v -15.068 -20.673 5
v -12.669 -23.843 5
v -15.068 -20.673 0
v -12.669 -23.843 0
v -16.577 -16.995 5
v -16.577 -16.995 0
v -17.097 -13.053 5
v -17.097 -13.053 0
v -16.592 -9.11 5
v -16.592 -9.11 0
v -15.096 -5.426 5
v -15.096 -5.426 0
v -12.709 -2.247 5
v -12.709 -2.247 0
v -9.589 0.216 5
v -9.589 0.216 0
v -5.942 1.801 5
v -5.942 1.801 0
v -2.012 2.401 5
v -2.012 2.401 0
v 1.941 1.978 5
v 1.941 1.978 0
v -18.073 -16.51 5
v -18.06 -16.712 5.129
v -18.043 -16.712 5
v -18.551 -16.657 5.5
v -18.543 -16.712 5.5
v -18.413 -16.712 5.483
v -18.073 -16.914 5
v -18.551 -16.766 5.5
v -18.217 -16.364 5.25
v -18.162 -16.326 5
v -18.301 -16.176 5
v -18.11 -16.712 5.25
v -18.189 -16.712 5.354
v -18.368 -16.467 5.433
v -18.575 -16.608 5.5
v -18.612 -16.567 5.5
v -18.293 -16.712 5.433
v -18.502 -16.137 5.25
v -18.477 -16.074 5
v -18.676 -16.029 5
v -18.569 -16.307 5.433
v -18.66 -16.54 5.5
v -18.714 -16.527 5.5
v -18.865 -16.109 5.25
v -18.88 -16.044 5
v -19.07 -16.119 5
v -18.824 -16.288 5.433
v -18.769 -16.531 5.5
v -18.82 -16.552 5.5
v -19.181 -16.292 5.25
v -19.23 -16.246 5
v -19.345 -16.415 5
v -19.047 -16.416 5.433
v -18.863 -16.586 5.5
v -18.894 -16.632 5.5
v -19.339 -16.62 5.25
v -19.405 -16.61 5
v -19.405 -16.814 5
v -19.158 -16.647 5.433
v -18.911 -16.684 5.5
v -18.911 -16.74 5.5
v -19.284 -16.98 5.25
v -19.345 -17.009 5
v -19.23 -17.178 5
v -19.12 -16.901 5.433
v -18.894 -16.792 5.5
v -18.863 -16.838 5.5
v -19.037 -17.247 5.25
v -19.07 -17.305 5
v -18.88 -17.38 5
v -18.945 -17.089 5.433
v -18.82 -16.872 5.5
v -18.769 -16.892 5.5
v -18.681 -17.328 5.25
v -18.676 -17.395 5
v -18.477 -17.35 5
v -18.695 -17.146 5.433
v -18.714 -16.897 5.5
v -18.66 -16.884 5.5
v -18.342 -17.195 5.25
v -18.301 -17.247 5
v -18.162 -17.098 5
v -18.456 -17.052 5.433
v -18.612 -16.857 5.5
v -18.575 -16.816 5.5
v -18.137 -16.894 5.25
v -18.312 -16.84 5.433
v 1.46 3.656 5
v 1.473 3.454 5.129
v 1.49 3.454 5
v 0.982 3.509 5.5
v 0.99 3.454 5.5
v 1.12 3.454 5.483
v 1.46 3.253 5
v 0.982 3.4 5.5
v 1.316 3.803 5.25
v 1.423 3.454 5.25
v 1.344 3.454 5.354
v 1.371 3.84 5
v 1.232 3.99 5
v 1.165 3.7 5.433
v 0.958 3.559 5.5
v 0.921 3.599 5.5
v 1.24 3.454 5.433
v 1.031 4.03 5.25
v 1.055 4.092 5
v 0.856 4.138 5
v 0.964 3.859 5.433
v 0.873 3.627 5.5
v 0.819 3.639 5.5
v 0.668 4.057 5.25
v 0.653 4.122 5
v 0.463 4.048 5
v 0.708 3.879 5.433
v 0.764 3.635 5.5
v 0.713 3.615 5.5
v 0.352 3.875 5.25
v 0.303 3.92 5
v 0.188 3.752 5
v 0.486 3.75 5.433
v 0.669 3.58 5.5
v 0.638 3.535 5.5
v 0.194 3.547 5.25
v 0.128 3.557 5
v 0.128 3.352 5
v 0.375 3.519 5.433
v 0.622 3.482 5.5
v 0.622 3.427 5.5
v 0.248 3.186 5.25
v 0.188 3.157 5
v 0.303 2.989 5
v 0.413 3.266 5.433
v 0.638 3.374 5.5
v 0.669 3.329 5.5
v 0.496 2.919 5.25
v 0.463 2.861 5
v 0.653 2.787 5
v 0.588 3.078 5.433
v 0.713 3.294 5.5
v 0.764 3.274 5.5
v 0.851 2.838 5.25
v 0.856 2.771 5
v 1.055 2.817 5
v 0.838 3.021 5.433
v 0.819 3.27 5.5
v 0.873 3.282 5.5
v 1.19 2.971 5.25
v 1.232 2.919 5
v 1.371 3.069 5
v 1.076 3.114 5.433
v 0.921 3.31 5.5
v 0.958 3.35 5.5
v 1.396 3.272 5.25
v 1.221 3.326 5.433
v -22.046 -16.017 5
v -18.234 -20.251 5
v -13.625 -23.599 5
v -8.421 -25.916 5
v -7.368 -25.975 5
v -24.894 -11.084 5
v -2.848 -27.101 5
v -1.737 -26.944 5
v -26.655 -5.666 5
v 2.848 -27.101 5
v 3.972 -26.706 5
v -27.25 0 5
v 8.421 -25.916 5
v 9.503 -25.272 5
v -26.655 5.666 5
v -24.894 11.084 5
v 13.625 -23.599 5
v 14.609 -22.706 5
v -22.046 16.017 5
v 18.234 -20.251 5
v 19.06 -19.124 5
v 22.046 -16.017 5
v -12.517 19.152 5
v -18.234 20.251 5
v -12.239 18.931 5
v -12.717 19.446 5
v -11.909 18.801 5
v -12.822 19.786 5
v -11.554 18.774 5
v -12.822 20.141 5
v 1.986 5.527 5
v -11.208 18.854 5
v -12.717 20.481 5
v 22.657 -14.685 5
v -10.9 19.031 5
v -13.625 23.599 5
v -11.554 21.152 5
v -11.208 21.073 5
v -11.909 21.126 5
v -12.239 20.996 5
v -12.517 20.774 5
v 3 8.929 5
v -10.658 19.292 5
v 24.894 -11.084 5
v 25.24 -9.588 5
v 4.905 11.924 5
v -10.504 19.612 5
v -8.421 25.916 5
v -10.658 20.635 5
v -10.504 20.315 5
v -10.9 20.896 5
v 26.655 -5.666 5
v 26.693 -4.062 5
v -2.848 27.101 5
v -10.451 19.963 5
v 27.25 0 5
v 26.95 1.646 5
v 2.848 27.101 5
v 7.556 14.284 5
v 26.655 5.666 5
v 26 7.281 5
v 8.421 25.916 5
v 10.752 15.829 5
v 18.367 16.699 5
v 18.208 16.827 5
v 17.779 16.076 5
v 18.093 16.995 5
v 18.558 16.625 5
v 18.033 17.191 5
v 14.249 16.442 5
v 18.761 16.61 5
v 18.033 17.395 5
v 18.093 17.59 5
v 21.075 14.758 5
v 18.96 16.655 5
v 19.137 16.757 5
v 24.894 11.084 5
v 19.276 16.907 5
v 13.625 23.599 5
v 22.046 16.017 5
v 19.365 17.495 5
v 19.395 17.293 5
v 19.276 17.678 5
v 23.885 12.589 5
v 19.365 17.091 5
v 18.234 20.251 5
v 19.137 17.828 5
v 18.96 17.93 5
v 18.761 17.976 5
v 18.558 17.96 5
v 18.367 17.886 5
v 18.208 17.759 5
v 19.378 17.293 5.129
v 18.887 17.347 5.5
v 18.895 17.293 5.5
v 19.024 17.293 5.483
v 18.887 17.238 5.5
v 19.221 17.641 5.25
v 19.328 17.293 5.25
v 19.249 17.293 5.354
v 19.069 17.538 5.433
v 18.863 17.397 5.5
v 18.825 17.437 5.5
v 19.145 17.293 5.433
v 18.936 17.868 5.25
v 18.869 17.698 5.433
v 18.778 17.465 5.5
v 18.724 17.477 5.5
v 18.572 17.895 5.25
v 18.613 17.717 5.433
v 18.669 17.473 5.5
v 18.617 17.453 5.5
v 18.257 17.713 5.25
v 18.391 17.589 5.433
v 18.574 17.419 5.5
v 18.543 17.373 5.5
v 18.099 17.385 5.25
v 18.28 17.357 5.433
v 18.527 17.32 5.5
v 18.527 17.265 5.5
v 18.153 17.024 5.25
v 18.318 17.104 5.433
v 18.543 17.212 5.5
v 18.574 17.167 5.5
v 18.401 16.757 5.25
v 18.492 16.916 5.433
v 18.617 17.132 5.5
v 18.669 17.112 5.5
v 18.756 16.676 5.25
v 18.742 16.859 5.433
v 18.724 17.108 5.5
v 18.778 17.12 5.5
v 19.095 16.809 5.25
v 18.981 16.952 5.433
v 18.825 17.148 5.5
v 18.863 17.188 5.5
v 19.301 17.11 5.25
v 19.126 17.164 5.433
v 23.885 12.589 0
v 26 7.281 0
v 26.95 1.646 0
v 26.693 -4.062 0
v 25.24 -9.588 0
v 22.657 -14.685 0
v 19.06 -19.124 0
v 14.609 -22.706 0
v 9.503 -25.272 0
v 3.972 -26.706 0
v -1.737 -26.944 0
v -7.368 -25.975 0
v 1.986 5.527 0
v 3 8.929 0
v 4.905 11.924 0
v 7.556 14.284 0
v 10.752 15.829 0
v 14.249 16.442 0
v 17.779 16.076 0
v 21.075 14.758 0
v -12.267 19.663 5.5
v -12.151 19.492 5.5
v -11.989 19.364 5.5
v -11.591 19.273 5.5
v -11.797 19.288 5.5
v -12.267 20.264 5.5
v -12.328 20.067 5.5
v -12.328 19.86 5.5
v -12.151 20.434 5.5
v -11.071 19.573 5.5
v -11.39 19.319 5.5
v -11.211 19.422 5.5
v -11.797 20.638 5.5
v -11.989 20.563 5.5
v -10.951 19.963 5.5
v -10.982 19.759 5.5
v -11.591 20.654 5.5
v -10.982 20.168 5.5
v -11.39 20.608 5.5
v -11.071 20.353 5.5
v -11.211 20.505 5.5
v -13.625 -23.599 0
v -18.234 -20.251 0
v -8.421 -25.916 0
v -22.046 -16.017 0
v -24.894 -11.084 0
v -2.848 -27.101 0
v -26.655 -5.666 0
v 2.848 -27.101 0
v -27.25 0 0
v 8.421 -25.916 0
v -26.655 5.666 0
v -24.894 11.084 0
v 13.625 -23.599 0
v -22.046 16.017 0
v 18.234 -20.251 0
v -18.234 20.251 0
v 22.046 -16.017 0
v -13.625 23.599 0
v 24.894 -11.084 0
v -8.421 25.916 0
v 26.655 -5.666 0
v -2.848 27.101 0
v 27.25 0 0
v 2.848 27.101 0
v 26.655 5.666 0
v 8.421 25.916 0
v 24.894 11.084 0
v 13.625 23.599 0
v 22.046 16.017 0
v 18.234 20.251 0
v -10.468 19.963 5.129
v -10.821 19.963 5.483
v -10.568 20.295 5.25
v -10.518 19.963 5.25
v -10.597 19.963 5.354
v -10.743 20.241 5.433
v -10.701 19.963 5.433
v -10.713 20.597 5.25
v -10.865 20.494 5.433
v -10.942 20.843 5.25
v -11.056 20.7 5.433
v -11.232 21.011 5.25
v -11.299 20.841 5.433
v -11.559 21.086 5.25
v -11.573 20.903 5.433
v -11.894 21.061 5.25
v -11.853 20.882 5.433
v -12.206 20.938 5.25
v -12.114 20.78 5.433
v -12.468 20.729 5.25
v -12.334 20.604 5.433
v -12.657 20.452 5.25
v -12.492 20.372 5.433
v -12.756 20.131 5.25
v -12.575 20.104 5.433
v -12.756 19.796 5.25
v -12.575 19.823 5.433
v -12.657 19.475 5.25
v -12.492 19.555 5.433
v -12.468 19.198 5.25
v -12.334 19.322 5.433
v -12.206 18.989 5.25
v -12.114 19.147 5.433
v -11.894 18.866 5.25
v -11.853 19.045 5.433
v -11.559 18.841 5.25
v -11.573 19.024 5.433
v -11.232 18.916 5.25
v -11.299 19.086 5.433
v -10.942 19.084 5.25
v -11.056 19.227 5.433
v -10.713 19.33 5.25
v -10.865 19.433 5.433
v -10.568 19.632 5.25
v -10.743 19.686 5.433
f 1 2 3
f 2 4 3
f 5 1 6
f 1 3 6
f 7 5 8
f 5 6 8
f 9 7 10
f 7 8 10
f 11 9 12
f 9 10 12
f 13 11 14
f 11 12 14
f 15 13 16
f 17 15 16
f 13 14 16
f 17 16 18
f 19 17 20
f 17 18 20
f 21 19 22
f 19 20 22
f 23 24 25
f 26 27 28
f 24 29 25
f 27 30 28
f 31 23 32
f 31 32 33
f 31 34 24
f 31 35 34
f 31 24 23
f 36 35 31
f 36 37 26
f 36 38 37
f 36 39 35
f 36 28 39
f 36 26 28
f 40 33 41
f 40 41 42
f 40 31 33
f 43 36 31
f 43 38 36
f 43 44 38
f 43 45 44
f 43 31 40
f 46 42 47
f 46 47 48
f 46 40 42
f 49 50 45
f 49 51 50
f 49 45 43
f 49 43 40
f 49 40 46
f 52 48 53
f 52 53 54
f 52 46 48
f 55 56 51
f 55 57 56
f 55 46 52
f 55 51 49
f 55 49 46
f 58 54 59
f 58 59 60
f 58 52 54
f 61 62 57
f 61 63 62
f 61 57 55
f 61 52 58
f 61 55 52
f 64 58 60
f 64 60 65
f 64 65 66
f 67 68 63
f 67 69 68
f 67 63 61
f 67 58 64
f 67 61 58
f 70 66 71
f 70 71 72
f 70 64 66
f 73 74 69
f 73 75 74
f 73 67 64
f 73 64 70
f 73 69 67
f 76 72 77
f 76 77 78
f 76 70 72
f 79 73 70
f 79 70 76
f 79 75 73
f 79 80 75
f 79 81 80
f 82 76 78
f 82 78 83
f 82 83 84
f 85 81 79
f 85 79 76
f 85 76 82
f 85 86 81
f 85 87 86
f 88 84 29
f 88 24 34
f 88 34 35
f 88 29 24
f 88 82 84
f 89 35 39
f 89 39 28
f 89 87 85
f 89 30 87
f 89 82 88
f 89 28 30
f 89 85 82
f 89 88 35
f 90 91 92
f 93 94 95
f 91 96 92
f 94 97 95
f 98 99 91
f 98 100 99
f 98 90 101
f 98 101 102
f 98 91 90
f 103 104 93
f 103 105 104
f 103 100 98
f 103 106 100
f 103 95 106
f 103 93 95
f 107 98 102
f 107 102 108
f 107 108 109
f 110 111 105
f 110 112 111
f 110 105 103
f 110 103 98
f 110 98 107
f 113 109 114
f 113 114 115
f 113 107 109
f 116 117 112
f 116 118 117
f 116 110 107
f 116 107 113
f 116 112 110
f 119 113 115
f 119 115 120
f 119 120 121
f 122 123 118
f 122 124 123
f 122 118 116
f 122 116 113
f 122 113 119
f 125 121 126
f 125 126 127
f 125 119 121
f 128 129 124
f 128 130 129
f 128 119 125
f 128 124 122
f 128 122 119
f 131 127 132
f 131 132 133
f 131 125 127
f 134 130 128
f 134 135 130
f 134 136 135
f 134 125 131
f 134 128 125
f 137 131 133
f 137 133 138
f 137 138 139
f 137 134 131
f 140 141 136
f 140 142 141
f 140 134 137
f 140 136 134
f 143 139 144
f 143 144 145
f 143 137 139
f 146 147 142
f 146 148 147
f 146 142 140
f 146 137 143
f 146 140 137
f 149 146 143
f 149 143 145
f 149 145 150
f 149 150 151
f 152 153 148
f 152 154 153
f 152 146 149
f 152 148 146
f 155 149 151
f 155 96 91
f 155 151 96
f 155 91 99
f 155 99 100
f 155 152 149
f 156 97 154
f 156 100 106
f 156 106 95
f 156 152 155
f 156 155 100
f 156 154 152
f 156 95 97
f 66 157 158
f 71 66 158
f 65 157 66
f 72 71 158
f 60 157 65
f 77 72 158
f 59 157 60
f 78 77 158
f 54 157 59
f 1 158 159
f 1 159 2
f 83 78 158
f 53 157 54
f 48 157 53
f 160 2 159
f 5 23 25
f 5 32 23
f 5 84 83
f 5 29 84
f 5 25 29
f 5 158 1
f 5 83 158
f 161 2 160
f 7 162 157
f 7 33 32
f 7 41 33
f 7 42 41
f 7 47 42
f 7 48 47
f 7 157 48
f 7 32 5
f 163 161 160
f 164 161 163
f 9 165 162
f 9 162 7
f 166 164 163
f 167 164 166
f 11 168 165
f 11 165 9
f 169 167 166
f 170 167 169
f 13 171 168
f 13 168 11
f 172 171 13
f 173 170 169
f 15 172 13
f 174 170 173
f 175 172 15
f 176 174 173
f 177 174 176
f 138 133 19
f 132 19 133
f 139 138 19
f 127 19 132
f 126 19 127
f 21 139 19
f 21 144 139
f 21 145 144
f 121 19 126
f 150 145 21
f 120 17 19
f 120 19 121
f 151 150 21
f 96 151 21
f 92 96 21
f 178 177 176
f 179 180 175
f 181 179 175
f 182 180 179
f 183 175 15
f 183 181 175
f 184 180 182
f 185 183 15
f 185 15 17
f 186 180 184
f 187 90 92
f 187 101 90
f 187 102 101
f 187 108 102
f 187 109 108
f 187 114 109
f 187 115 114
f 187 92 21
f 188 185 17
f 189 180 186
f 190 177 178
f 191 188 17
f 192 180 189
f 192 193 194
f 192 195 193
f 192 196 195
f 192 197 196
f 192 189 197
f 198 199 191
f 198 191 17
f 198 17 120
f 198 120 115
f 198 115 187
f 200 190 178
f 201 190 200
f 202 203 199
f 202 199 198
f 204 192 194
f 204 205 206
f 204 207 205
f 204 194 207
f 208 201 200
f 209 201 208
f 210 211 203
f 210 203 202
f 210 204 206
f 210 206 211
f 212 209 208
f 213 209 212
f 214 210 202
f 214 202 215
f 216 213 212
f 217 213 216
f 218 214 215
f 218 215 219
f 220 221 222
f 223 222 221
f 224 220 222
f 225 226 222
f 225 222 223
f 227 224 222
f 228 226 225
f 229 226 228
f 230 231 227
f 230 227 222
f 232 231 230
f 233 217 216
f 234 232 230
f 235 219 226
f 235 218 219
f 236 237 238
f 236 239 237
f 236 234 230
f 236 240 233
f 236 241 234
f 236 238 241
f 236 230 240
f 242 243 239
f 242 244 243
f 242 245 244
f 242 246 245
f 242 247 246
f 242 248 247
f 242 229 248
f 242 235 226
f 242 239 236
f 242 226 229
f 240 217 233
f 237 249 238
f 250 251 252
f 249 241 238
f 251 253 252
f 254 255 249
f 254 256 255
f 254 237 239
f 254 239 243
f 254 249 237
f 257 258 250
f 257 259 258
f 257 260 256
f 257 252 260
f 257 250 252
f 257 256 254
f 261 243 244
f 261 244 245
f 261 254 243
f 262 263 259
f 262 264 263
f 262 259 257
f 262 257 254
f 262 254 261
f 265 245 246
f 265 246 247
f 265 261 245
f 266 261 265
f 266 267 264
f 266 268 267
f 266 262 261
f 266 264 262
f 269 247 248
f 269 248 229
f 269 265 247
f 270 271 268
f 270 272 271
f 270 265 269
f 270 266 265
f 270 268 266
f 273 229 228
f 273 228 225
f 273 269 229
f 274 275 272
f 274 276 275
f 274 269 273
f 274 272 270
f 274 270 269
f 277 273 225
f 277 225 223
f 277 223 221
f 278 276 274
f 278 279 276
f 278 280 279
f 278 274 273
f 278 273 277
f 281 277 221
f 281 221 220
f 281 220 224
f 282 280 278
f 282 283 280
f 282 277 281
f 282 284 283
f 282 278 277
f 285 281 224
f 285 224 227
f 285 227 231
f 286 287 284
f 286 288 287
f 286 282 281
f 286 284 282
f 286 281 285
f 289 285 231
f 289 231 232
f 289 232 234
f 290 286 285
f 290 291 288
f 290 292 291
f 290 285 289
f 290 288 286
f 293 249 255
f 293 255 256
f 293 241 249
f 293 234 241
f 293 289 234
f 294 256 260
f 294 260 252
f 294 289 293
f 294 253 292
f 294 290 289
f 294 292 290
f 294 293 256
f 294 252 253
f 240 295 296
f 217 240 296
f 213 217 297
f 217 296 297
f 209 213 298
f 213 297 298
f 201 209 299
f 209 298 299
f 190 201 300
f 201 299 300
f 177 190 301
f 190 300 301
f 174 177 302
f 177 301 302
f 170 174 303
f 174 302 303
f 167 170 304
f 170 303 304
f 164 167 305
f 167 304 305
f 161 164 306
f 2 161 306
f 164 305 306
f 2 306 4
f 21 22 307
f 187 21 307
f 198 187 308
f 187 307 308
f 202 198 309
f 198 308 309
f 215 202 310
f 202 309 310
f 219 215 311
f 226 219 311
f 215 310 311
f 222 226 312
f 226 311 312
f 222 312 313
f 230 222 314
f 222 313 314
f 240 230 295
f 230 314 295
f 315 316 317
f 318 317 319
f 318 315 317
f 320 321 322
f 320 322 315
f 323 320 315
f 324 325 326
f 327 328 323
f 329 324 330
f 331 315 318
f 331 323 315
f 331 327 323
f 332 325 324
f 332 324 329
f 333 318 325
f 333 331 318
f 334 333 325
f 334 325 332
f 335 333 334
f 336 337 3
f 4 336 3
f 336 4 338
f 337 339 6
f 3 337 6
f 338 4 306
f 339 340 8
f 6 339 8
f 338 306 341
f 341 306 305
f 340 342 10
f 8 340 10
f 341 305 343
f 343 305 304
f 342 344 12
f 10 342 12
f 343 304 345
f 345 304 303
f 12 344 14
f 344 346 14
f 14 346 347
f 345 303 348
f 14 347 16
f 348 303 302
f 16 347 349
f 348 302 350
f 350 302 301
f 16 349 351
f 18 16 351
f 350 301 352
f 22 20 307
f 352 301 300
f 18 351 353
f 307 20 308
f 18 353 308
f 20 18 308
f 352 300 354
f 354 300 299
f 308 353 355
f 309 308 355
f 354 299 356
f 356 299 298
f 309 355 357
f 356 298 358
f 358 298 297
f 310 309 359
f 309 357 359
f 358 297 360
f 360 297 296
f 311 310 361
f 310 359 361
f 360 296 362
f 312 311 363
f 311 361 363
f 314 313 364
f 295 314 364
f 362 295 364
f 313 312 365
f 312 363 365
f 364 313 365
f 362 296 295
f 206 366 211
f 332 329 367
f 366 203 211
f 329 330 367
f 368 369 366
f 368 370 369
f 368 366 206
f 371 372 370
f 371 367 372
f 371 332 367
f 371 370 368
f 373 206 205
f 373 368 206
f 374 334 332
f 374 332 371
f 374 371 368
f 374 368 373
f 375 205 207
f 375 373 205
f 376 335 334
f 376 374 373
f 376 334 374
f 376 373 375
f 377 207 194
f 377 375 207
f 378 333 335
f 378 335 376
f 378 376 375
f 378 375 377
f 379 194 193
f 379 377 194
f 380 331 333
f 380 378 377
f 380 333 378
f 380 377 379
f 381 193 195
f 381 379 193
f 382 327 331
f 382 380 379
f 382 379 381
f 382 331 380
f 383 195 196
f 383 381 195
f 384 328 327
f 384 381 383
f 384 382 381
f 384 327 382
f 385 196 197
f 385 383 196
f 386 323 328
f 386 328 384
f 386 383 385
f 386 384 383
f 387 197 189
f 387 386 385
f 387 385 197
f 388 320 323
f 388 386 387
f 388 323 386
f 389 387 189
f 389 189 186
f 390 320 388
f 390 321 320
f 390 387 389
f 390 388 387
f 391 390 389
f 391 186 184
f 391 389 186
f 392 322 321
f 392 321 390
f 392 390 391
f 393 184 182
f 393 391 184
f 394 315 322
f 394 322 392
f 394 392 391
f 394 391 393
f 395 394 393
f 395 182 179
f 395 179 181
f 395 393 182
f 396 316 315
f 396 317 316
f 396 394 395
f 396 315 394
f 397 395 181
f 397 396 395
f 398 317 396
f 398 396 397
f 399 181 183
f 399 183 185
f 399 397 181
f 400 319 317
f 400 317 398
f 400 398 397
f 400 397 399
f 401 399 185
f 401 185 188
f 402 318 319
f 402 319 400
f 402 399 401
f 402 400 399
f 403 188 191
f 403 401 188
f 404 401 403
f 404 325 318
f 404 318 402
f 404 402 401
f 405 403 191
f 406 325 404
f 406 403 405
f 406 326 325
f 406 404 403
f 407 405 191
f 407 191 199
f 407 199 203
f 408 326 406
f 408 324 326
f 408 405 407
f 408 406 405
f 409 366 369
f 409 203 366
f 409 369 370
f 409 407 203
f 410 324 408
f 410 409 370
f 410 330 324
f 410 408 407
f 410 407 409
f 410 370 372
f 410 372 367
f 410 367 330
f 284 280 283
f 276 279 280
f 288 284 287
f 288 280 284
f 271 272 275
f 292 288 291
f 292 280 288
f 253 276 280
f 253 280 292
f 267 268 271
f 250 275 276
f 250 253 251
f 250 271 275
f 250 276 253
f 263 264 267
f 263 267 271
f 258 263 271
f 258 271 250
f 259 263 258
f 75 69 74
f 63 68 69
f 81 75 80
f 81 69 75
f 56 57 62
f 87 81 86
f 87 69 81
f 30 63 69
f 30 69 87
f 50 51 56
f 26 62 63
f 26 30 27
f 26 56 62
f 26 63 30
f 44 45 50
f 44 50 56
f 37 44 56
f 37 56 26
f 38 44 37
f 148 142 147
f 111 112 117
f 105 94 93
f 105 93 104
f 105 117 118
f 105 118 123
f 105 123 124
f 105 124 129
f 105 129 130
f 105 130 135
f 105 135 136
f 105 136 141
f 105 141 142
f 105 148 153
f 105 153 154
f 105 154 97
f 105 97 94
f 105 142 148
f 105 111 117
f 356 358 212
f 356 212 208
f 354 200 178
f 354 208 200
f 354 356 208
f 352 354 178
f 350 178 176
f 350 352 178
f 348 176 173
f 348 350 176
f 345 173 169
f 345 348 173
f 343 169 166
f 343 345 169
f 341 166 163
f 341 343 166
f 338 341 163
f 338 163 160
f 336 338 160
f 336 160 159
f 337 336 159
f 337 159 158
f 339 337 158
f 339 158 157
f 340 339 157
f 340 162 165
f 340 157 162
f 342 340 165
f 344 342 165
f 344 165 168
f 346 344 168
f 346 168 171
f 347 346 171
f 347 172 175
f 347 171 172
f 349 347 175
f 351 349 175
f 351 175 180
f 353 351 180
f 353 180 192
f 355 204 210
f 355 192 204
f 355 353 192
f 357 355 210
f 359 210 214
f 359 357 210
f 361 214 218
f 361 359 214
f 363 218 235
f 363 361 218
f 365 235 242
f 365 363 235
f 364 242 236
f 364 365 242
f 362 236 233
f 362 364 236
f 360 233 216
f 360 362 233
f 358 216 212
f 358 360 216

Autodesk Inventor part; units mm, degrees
ref_plane "YZ Plane" through (0, 0, 0) normal (1, 0, 0) x (0, 1, 0)
ref_plane "XZ Plane" through (0, 0, 0) normal (0, 1, 0) x (-1, 0, 0)
ref_plane "XY Plane" through (0, 0, 0) normal (0, 0, 1) x (1, 0, 0)
sketch "Esquisse1" plane through (0, 0, 0) normal (0, 0, 1) x (1, 0, 0)
  circle A0 centre (0, 0) radius 27
  circle A1 centre (-1.666702, -13.02482) radius 15.430073
  circle A2 centre (14.698986, 3.590179) radius 12.859707
  circle A3 centre (0, 0) radius 27.25
  circle A4 centre (0.777883, 3.425174) radius 0.684809
  circle A5 centre (-18.340493, -16.491398) radius 0.684809
  circle A6 centre (-11.511215, 19.899288) radius 1.369619
  circle A7 centre (18.687299, 17.311193) radius 0.684809
  point P0 (1.940785, 1.977619)
  point P1 (23.885419, 12.589152)
  point P2 (-12.669004, -23.843161)
  dimension "d0" = 54
  dimension "d6" = 54.5
  dimension "d9" = 1.36962
sketch "Esquisse1 outline for Cadran" plane through (0, 0, 0) normal (0, 0, 1) x (1, 0, 0)
  circle A0 centre (0, 0) radius 27.25
  arc A1 (23.885419, 12.589152) -> (-12.669004, -23.843161) centre (0, 0) cw
  arc A2 (1.940785, 1.977619) -> (23.885419, 12.589152) centre (14.698986, 3.590179) cw
  arc A3 (-12.669004, -23.843161) -> (1.940785, 1.977619) centre (-1.666702, -13.02482) cw
extrude "Cadran" add sketch "Esquisse1 outline for Cadran" along normal blind 5
sketch "Esquisse4" plane through (0, 0, 5) normal (0, 0, 1) x (1, 0, 0)
  circle A0 centre (-11.643189, 19.963438) radius 1.192314
  circle A1 centre (0.805137, 3.454442) radius 0.685
  circle A2 centre (-18.727601, -16.711919) radius 0.685
  circle A3 centre (18.709962, 17.292624) radius 0.685
  point P0 (0, 0)
  dimension "d10" = 1.37
extrude "Emplacements Vis" add sketch "Esquisse4" along normal blind 0.5
fillet "Congé1" radius 0.5 1 edges at (18.025, 17.2926, 5.5)
fillet "Congé2" radius 0.5 1 edges at (0.1201, 3.4544, 5.5)
fillet "Congé3" radius 0.5 1 edges at (-12.8355, 19.9634, 5.5)
fillet "Congé4" radius 0.5 1 edges at (-19.4126, -16.7119, 5.5)
properties part number "Candran face cache"
